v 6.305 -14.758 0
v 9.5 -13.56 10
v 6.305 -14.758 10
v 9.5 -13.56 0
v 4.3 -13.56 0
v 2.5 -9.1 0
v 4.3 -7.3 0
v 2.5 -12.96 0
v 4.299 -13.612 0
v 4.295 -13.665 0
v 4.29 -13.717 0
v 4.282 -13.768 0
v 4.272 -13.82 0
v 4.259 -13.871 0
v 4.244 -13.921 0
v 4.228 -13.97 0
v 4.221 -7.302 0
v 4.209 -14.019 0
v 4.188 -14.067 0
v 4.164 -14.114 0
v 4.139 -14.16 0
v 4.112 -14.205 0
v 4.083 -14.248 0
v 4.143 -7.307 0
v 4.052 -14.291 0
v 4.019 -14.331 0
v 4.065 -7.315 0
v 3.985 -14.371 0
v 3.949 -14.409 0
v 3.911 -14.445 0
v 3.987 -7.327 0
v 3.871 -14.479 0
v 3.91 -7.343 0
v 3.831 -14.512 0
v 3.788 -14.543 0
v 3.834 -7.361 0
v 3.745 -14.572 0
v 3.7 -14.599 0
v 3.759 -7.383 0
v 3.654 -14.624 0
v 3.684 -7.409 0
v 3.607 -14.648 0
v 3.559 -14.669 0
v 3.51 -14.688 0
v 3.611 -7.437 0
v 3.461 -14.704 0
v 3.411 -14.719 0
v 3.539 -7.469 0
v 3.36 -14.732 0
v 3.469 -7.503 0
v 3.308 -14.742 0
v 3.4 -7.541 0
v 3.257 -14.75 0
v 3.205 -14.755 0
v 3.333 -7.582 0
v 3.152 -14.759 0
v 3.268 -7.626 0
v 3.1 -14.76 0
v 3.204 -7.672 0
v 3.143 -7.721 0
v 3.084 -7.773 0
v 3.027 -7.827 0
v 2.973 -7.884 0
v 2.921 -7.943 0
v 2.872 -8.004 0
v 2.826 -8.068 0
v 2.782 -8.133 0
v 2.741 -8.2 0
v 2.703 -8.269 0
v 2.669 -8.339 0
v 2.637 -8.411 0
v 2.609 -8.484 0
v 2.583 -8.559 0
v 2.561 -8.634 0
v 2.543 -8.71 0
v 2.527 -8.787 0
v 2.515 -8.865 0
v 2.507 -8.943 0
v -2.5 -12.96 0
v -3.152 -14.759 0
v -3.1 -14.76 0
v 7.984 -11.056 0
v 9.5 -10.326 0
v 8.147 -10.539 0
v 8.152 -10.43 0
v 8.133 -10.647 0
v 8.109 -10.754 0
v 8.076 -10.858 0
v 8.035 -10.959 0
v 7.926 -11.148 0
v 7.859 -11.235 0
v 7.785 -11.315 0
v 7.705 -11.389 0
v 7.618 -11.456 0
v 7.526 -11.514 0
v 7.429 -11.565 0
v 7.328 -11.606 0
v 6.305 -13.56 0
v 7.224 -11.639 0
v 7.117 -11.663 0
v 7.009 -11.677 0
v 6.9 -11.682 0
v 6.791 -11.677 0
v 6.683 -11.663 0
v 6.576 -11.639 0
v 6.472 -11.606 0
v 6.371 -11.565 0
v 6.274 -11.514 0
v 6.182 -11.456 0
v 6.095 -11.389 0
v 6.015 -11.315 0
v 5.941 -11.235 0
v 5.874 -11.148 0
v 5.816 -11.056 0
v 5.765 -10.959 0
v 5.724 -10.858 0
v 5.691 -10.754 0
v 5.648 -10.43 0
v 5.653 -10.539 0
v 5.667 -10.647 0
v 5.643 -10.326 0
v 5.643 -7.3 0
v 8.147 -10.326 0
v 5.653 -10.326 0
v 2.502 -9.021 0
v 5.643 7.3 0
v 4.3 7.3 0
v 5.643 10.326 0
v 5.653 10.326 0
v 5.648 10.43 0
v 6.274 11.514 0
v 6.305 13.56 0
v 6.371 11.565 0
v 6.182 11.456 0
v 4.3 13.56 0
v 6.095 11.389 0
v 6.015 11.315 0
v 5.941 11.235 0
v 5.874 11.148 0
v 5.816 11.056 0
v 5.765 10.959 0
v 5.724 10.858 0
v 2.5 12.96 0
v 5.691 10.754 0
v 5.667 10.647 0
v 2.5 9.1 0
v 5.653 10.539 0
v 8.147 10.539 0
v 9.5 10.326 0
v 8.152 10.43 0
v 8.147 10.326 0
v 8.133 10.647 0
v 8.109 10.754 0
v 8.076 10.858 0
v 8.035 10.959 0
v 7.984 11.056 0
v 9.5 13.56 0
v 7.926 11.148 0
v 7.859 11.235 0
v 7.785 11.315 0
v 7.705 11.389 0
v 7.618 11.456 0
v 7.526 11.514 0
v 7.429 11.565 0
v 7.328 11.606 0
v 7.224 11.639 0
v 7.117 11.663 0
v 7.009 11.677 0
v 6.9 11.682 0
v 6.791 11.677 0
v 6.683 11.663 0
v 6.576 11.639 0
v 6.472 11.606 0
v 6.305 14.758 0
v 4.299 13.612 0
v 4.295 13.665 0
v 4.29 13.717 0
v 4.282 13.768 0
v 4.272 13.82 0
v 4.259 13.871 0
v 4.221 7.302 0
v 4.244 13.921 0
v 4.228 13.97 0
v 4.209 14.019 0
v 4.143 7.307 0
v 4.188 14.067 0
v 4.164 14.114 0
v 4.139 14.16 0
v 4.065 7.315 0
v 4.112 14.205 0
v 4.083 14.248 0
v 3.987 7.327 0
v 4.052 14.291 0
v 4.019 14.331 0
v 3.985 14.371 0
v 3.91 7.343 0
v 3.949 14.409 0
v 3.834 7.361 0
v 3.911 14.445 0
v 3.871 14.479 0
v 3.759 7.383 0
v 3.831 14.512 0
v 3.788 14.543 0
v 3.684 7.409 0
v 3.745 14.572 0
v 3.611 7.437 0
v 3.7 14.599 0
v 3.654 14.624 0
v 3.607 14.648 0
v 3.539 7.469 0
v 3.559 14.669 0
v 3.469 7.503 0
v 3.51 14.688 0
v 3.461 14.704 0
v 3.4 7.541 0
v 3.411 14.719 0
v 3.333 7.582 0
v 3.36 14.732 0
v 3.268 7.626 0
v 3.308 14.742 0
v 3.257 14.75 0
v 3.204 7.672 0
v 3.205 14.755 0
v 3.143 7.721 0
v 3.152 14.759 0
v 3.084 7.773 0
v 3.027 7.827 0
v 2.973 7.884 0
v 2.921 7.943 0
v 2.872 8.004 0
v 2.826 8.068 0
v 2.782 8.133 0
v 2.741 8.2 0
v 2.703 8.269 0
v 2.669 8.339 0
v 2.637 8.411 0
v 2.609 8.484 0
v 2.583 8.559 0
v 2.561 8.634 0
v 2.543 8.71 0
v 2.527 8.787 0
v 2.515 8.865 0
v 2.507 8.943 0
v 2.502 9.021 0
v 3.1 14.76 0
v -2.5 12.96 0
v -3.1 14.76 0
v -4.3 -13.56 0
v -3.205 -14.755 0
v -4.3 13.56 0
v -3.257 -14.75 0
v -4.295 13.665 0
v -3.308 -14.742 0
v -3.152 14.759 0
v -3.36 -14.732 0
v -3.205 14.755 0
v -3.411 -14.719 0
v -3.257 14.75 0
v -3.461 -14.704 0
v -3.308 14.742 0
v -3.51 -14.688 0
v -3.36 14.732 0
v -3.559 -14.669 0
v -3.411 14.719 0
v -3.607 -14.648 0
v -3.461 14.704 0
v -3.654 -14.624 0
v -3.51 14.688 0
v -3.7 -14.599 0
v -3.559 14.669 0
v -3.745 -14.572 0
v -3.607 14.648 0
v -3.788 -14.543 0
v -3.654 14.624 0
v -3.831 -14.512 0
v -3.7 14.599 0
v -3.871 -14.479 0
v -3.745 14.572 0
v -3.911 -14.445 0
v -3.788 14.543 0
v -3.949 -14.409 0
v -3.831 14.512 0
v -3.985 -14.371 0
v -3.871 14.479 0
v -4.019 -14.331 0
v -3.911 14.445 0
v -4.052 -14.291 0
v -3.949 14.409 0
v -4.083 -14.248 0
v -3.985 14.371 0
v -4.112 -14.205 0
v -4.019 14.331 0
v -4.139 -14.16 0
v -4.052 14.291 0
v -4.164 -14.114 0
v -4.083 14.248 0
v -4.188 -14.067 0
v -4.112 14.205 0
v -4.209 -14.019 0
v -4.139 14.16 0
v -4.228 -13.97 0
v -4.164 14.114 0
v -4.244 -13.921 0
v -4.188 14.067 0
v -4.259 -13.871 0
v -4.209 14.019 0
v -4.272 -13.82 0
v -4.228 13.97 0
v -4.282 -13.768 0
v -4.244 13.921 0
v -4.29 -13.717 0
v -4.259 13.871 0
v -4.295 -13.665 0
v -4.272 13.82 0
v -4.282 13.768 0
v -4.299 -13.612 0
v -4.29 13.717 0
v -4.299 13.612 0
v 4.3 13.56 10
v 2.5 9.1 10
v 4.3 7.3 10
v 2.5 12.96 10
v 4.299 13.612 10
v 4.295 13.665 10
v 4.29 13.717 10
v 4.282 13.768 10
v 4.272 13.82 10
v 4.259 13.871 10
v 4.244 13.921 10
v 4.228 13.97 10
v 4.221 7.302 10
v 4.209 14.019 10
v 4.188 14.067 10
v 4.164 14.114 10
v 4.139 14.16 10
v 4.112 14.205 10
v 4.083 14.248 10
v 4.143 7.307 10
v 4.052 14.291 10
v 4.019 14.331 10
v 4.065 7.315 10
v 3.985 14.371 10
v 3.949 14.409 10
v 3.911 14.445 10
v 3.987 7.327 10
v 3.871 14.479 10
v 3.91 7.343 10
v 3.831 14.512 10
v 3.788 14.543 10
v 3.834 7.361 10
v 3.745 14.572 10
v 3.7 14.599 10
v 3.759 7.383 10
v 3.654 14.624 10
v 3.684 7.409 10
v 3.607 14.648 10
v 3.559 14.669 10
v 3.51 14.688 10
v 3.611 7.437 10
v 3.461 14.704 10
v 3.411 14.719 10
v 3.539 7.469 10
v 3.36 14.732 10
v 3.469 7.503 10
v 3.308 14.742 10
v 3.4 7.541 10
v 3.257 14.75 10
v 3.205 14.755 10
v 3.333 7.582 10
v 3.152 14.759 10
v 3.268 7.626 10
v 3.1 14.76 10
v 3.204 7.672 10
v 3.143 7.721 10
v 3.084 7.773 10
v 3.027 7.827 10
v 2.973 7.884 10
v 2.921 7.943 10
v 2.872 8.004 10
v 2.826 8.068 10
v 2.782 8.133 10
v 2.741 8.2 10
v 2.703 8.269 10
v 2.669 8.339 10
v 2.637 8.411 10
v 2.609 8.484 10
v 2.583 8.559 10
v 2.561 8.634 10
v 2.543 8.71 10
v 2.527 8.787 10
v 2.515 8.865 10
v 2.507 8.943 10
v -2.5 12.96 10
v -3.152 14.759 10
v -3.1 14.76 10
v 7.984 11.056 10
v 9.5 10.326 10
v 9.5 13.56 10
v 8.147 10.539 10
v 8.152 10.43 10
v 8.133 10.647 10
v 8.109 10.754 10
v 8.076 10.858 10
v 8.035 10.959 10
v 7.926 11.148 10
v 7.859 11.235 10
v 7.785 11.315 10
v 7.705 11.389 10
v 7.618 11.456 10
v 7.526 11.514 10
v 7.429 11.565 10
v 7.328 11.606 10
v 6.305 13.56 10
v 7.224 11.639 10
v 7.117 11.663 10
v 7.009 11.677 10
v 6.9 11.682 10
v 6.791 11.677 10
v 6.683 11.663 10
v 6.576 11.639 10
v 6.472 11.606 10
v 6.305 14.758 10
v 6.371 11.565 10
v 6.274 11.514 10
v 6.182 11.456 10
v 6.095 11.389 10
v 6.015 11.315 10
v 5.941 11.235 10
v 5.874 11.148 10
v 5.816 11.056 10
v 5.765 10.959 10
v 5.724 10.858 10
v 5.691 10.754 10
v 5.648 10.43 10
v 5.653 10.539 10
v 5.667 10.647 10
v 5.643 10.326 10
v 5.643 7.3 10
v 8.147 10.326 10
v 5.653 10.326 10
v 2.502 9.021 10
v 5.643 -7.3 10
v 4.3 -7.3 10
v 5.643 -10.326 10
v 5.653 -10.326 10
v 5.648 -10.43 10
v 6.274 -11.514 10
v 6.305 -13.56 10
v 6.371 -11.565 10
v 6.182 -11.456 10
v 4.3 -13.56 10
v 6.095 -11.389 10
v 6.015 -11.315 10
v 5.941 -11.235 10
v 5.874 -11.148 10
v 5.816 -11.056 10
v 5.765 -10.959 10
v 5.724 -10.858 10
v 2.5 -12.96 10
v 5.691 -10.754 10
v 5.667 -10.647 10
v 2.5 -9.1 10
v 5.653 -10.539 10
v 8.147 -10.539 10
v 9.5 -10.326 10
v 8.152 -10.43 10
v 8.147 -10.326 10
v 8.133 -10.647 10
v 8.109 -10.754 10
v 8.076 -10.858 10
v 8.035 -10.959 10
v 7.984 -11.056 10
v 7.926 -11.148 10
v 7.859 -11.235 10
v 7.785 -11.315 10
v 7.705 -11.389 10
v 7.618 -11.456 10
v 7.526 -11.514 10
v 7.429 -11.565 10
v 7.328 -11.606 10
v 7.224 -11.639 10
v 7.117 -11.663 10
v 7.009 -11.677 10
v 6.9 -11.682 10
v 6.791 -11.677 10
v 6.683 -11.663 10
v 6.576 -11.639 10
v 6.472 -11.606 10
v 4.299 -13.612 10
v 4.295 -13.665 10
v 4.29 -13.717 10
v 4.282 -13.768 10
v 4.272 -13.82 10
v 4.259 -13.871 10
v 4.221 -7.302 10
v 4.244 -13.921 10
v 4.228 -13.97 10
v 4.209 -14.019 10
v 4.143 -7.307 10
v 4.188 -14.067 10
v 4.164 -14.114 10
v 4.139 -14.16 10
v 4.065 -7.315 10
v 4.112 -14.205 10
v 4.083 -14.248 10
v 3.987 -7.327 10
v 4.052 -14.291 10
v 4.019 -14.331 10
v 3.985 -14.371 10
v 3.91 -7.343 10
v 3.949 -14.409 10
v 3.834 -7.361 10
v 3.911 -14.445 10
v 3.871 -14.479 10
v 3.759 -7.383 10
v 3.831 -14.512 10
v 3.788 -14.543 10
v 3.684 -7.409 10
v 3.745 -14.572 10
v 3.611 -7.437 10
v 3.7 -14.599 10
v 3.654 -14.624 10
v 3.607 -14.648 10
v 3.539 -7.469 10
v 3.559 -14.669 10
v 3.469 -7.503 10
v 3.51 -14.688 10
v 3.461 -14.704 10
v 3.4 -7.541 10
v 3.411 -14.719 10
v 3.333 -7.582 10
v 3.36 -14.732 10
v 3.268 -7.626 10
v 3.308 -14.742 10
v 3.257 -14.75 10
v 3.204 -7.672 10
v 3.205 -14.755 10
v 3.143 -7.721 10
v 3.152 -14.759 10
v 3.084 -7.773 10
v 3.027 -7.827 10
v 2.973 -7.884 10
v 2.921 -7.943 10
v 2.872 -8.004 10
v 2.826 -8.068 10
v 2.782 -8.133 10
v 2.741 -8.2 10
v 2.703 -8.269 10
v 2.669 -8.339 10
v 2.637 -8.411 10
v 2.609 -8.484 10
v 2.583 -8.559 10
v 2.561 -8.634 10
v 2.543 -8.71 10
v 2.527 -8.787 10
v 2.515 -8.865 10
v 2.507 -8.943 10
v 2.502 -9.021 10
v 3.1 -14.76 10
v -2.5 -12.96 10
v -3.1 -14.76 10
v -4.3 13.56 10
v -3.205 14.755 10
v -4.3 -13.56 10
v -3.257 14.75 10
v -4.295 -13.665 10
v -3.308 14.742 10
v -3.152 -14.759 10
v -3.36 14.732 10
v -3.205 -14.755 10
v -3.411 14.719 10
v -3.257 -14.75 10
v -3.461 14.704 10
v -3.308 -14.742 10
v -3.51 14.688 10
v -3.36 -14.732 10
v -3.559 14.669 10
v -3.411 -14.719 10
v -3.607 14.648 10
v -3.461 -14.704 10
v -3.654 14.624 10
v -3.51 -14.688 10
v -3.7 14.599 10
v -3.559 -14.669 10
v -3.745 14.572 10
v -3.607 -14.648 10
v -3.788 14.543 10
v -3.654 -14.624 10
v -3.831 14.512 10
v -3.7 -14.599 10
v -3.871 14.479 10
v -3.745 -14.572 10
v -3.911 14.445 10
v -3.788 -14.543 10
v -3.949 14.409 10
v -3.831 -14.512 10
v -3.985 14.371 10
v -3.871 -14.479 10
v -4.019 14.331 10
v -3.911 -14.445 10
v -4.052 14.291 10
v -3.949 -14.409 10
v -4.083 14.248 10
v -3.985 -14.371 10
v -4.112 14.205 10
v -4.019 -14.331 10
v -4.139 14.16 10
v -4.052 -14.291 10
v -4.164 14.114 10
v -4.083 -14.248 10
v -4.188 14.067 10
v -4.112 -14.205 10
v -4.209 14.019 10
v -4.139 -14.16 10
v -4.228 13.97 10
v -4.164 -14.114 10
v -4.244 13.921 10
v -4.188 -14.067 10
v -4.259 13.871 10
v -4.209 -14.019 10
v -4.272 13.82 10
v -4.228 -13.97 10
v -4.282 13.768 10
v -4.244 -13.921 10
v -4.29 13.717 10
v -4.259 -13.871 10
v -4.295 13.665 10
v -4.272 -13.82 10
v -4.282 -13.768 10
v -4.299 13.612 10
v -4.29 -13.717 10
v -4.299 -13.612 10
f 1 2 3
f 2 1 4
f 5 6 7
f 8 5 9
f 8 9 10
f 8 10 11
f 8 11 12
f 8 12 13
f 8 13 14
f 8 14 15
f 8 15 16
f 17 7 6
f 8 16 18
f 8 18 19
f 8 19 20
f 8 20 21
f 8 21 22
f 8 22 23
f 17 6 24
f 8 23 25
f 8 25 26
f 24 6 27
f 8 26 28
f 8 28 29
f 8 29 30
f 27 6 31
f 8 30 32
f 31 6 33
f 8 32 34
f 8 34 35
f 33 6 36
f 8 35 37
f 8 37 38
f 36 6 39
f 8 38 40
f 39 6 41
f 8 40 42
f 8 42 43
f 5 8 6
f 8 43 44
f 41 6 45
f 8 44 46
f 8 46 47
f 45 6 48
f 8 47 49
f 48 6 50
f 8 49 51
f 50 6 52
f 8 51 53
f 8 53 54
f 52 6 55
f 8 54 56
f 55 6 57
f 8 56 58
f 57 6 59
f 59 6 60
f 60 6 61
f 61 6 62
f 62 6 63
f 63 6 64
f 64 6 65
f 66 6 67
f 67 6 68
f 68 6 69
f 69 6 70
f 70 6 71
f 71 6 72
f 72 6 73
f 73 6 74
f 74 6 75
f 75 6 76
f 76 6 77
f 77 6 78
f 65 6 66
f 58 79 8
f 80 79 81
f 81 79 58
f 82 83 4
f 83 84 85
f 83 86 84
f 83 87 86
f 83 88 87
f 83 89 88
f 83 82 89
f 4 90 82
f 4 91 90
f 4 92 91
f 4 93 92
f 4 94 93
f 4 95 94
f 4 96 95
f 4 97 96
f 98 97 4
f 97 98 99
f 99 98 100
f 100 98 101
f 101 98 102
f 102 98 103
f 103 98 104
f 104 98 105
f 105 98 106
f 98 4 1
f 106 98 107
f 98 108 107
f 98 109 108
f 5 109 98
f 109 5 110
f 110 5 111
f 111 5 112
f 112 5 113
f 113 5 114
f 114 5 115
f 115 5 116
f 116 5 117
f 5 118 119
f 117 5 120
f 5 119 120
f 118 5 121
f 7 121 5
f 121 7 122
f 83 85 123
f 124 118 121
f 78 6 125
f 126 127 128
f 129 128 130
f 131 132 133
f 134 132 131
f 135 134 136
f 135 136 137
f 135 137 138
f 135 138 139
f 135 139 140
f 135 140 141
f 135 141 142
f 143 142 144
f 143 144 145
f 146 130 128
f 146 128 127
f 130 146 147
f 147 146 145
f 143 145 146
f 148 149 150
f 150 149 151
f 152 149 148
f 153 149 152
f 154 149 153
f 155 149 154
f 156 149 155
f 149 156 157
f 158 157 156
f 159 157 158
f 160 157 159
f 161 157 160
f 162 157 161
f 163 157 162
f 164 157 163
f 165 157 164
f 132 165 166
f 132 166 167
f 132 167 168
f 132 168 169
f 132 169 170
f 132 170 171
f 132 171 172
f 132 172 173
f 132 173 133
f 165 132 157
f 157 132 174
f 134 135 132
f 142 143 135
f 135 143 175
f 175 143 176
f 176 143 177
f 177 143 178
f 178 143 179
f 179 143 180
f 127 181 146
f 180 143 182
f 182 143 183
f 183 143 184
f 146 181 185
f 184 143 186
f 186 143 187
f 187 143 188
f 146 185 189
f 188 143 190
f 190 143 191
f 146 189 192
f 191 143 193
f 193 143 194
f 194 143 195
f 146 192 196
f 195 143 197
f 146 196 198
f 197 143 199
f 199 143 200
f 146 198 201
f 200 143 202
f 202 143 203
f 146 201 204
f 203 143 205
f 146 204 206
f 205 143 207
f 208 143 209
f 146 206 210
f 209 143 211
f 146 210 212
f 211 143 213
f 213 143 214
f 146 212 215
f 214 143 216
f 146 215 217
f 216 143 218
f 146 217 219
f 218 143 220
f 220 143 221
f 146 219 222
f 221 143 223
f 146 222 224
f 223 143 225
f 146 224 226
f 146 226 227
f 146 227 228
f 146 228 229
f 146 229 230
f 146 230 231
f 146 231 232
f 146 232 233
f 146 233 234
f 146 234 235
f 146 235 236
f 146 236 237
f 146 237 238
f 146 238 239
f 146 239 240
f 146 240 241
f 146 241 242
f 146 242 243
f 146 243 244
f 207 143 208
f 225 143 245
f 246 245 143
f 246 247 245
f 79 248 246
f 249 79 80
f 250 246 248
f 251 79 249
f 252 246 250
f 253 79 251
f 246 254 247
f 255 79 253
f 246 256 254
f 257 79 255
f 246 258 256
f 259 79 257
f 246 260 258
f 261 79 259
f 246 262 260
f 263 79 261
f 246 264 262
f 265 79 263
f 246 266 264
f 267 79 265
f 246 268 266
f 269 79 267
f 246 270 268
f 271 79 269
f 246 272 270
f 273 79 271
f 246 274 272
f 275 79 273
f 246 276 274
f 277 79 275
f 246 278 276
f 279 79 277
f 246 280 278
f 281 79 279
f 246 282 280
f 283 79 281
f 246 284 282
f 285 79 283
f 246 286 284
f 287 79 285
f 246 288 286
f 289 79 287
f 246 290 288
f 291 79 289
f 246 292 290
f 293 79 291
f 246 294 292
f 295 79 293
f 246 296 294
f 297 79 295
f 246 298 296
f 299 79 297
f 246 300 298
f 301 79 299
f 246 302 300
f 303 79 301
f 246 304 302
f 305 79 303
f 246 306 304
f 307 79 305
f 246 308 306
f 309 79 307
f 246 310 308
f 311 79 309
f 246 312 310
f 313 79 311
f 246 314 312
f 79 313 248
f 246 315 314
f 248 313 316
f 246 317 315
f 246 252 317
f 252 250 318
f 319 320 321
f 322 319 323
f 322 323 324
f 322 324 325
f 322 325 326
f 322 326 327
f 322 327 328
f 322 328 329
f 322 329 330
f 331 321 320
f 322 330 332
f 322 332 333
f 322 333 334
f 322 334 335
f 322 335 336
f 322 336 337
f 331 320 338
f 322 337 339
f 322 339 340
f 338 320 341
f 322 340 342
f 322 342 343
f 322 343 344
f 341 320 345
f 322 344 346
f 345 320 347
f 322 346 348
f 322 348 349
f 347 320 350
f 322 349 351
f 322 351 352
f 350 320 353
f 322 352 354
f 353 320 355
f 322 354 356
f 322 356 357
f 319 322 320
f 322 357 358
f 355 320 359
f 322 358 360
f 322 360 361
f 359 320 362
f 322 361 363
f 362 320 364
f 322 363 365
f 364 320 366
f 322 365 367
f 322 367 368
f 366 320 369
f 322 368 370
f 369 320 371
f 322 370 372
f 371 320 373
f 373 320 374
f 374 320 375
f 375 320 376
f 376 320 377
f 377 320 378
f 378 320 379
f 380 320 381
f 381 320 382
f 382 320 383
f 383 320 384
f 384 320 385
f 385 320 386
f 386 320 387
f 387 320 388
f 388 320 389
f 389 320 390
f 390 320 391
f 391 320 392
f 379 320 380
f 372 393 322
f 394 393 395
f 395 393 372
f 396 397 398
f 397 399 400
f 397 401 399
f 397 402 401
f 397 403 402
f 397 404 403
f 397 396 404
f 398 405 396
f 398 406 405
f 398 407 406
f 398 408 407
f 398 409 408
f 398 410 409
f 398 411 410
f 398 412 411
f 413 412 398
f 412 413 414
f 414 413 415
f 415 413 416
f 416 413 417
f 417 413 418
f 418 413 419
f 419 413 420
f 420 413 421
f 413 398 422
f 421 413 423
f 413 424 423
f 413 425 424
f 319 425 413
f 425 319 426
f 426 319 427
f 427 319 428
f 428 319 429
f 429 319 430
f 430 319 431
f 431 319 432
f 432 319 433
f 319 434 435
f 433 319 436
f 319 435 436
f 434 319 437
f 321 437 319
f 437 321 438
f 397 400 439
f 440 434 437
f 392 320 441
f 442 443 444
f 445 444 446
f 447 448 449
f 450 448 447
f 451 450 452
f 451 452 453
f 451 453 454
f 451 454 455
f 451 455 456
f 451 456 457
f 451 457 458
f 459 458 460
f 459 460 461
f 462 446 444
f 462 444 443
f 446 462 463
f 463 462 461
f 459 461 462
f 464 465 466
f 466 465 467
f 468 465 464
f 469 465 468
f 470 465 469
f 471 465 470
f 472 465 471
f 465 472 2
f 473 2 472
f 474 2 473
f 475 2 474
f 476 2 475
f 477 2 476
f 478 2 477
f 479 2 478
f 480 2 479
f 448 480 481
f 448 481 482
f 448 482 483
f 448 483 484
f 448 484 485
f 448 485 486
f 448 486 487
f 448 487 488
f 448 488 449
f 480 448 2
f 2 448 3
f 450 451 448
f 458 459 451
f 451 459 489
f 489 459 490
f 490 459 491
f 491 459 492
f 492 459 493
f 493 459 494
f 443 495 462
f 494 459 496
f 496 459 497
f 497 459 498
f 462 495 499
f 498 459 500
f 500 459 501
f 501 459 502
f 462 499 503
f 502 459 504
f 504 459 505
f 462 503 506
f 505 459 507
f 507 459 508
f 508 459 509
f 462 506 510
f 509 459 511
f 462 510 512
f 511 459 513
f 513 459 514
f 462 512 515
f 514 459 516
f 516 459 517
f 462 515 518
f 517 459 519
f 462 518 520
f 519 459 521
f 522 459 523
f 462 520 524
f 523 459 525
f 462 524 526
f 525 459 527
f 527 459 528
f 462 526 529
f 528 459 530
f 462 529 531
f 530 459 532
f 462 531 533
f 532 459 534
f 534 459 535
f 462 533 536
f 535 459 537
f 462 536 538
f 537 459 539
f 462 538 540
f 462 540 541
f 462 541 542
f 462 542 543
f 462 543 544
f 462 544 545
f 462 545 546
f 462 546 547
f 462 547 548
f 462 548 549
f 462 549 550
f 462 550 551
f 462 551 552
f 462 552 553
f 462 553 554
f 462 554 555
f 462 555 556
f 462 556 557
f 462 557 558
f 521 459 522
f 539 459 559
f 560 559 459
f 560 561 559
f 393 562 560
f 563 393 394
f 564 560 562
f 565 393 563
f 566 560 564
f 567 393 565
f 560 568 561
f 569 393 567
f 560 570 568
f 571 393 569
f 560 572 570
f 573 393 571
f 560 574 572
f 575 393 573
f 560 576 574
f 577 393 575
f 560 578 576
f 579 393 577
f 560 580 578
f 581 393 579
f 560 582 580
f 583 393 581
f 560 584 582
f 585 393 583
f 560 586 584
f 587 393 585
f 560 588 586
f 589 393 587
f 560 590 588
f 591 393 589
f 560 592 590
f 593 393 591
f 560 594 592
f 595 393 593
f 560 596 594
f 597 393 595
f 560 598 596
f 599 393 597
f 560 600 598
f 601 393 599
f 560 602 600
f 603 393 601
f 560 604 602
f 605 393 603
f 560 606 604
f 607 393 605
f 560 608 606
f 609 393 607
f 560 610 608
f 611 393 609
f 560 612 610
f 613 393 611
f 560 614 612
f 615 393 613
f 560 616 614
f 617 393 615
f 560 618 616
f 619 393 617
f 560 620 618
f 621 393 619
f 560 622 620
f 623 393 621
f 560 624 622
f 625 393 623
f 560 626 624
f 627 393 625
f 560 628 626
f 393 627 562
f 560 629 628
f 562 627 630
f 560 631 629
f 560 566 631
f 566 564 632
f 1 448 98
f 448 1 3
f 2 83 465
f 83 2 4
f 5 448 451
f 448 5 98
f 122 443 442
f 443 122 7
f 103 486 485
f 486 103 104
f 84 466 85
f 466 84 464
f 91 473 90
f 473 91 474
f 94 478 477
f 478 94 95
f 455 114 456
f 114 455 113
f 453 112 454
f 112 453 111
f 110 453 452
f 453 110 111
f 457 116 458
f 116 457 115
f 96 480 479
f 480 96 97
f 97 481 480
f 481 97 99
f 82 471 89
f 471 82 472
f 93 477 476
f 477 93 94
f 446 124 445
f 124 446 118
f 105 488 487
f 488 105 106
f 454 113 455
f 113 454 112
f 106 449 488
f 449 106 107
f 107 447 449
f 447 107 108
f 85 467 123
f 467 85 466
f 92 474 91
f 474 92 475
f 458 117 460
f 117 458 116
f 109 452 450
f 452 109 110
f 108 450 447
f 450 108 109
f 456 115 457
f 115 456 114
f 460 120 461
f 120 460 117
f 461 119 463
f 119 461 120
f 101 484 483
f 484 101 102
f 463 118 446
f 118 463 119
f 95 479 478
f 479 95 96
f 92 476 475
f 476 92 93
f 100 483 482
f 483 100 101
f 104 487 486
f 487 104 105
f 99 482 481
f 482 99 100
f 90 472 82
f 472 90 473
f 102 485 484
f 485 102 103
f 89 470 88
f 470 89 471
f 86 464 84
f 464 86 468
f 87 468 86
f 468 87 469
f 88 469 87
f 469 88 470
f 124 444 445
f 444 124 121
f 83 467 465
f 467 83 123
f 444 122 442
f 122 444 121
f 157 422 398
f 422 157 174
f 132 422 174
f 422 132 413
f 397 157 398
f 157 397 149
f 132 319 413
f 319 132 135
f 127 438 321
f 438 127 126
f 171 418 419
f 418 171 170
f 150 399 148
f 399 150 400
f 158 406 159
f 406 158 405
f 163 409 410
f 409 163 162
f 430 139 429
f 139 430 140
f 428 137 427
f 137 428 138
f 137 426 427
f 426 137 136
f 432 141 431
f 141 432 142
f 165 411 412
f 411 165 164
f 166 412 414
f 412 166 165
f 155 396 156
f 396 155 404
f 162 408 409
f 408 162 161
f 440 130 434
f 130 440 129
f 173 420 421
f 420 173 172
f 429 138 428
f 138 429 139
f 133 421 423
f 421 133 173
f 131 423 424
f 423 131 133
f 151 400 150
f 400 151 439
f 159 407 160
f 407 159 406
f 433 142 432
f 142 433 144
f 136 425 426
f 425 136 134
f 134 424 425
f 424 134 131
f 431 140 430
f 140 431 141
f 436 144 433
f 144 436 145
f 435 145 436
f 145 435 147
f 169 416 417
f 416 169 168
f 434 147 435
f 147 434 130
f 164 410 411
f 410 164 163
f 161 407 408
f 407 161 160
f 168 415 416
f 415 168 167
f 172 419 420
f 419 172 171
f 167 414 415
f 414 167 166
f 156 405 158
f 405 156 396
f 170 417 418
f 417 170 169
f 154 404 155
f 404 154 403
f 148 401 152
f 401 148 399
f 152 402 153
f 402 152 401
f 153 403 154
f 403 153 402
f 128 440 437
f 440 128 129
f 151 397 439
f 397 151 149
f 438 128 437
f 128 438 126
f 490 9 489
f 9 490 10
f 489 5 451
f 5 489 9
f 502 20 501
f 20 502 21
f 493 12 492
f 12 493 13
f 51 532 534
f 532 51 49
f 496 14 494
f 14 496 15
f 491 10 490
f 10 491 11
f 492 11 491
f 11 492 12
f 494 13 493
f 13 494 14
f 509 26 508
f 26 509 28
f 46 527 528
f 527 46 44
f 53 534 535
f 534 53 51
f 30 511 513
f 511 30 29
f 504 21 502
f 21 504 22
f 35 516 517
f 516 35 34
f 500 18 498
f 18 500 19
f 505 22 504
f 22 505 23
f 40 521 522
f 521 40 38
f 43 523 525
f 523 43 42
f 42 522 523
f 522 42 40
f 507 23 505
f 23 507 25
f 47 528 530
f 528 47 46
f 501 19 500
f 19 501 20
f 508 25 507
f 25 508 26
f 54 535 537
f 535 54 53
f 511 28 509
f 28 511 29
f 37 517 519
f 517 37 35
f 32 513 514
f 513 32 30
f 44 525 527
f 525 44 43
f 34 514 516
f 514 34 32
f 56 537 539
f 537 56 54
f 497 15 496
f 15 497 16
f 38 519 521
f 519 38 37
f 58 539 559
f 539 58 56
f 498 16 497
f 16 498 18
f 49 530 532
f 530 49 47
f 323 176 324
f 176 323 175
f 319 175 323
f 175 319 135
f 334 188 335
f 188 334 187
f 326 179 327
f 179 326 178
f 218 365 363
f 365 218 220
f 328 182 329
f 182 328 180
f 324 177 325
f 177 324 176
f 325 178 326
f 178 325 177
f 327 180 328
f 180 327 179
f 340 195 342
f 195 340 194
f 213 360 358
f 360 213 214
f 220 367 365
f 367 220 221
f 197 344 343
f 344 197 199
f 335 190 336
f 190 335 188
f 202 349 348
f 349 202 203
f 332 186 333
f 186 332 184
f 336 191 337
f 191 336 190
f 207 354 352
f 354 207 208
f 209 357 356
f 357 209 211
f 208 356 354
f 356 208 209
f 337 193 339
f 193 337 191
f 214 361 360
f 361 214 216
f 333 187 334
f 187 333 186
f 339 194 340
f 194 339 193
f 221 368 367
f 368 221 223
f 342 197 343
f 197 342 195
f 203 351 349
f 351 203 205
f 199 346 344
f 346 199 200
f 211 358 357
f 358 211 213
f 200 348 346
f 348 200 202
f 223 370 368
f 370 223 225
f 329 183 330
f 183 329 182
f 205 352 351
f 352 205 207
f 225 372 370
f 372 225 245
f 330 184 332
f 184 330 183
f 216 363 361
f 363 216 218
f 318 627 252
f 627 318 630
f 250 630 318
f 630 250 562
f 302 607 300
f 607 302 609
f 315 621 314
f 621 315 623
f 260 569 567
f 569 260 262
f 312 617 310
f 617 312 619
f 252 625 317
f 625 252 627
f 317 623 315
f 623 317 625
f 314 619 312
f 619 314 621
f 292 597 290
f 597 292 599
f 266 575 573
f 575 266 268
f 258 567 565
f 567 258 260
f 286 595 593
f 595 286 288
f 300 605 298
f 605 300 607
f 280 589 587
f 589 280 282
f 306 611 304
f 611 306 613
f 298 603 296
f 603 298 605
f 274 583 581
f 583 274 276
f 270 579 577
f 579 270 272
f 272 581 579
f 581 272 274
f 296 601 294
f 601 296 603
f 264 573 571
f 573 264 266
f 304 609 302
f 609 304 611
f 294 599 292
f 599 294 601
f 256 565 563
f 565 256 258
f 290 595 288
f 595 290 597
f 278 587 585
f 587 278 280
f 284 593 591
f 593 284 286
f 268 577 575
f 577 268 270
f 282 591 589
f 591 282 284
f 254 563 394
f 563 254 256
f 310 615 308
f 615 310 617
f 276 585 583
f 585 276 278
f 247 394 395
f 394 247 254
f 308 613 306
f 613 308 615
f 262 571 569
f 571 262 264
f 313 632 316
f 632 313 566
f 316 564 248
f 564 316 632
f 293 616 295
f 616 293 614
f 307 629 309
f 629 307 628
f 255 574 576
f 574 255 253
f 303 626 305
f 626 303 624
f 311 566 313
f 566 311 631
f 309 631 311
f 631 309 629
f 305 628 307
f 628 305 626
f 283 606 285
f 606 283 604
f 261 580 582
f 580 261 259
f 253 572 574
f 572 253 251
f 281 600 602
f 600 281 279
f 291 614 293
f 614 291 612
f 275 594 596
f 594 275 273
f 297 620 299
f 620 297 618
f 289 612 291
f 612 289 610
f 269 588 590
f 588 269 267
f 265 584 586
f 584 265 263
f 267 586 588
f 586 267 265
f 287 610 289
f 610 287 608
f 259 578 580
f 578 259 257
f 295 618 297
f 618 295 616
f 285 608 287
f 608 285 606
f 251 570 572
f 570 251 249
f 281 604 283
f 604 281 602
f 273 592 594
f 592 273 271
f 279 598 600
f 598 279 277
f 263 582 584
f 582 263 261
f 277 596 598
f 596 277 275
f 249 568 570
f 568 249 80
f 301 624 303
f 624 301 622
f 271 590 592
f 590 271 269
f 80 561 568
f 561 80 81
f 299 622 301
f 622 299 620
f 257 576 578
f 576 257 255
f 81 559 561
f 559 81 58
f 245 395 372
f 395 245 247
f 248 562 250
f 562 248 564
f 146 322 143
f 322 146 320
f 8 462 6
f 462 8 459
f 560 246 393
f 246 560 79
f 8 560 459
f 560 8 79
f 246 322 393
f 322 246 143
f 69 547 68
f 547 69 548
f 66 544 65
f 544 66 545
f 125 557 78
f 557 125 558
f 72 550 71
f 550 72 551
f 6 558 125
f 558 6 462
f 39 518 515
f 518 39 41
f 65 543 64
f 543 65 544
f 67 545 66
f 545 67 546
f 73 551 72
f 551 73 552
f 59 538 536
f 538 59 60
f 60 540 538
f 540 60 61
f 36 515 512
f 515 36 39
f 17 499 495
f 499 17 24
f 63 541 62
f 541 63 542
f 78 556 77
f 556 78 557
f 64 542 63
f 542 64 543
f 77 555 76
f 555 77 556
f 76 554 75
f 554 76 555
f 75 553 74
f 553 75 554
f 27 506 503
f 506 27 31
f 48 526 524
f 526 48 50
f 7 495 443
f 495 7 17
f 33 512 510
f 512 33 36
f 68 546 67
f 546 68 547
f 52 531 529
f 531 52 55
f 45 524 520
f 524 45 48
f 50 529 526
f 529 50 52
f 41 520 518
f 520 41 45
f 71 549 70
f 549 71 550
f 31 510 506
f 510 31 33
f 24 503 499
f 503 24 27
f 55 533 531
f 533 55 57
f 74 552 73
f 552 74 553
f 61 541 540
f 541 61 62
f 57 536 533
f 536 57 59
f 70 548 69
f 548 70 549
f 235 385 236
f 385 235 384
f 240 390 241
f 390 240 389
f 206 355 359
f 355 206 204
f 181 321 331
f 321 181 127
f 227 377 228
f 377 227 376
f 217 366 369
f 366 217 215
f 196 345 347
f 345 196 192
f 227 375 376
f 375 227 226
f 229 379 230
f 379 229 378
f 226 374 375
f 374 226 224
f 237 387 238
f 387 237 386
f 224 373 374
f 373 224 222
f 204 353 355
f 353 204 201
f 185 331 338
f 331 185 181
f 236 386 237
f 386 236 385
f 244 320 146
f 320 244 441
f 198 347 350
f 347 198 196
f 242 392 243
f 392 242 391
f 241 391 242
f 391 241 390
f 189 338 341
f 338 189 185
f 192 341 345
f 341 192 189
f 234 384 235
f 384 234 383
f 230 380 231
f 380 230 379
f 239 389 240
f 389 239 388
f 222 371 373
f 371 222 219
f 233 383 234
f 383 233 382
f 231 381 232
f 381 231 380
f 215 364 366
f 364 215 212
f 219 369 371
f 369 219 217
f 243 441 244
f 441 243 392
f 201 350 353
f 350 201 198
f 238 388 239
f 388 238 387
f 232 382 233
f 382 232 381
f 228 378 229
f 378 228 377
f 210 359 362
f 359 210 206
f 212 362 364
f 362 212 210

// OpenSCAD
height1 = 28; // How far does the part stretch over the extrusion.
depth1 = 8; // The distance from the extrusion surface to the outer edge of the channel.
width = 10; // The width of the clip.
channel_gap = 14.60; // The distance between the inner edges of the channels in the extrusion.
channel_depth = 5.2; // The depth of the channels.
channel_width = 6.26; // The width of the channels.
thickness = 1.8; // The thickness of the clip.
clip_dist = 1.2; // The distance by which the clip extends beyond the entry width of the channel.
clip_over_t = 2; // The thickness of the narrowing of the channels.
tol01 = 0.01; // A small value to avoid coincident surfaces causing rendering problems.
snapIn = true; // If True then you can clip the part into the extrusion. If False you'll probably have to slide it into the extrusion while constructing your project

height = height1<(2*channel_width + channel_gap +clip_dist*2) ? 2*channel_width + channel_gap +clip_dist*2 : height1 ; // ensure the height is not less than required to provide a lip over the edge of each channel

depth = depth1<(2*thickness+5) ? 2*thickness+5 : depth1 ;

feature_dia = (height-channel_gap-channel_width*2)/2<(depth-thickness*2)/2 ? (height-channel_gap-channel_width*2)/2 : (depth-thickness*2)/2 ;

feature_dia_inner = (feature_dia-channel_width/2)<0 ?  0 : feature_dia-channel_width/2 ;

module holder(){
    difference(){
        cube([depth,width,height],center=true);
        translate([0,0,0]) cube([depth-thickness*2,width+tol01,height-depth],center=true);
        translate([thickness/2+tol01/2,0,0]) cube([depth-thickness+tol01,width+tol01,channel_gap],center=true);      
        translate([depth/2-feature_dia,0,height/2-feature_dia]) difference(){
            translate([(feature_dia+tol01)/2,0,+feature_dia/2+tol01/2]) cube([feature_dia+tol01,width+tol01,feature_dia+tol01],center=true);
            translate([0,0,0]) rotate([90,0,0]) cylinder(h=width+tol01*2,d=feature_dia*2,$fn=144,center=true);
        }
        scale([1,1,-1]) translate([depth/2-feature_dia,0,height/2-feature_dia]) difference(){
            translate([(feature_dia+tol01)/2,0,+feature_dia/2+tol01/2]) cube([feature_dia+tol01,width+tol01,feature_dia+tol01],center=true);
            translate([0,0,0]) rotate([90,0,0]) cylinder(h=width+tol01*2,d=feature_dia*2,$fn=144,center=true);
        }        
        scale([-1,1,-1]) translate([depth/2-feature_dia,0,height/2-feature_dia]) difference(){
            translate([(feature_dia+tol01)/2,0,+feature_dia/2+tol01/2]) cube([feature_dia+tol01,width+tol01,feature_dia+tol01],center=true);
            translate([0,0,0]) rotate([90,0,0]) cylinder(h=width+tol01*2,d=feature_dia*2,$fn=144,center=true);
        }
        scale([-1,1,1]) translate([depth/2-feature_dia,0,height/2-feature_dia]) difference(){
            translate([(feature_dia+tol01)/2,0,+feature_dia/2+tol01/2]) cube([feature_dia+tol01,width+tol01,feature_dia+tol01],center=true);
            translate([0,0,0]) rotate([90,0,0]) cylinder(h=width+tol01*2,d=feature_dia*2,$fn=144,center=true);
        }
        translate([depth/2-thickness-feature_dia_inner,0,height/2-thickness-feature_dia_inner]) rotate([90,0,0]) cylinder(h=width+tol01,d=feature_dia_inner*2,$fn=72,center=true);
        scale([1,1,-1]) translate([depth/2-thickness-feature_dia_inner,0,height/2-thickness-feature_dia_inner]) rotate([90,0,0]) cylinder(h=width+tol01,d=feature_dia_inner*2,$fn=72,center=true);
        scale([-1,1,-1]) translate([depth/2-thickness-feature_dia_inner,0,height/2-thickness-feature_dia_inner]) rotate([90,0,0]) cylinder(h=width+tol01,d=feature_dia_inner*2,$fn=72,center=true);
        scale([-1,1,1]) translate([depth/2-thickness-feature_dia_inner,0,height/2-thickness-feature_dia_inner]) rotate([90,0,0]) cylinder(h=width+tol01,d=feature_dia_inner*2,$fn=72,center=true);
        cube([depth-thickness*2,width+tol01,height-(thickness+feature_dia_inner)*2],center=true);
        cube([depth-(feature_dia_inner+thickness)*2,width+tol01,height-thickness*2],center=true);
    }
}

module clip(){
    difference(){
        union(){
            translate([-thickness/2,0,0]) cube([channel_depth+thickness,width,channel_width],center=true);
            difference(){
                translate([-channel_depth/2+clip_over_t,0,channel_width/2]) rotate([90,0,0]) scale([channel_depth-clip_over_t,clip_dist,1]) cylinder(h=width,d=2,$fn=4,center=true);
                translate([-(channel_depth-clip_over_t)/2-channel_depth/2+clip_over_t,0,channel_width/2]) cube([channel_depth-clip_over_t+tol01,width+tol01,clip_dist*2+tol01],center=true);
            }
            difference(){
                translate([-channel_depth/2+clip_over_t,0,-channel_width/2]) rotate([90,0,0]) scale([channel_depth-clip_over_t,clip_dist,1]) cylinder(h=width,d=2,$fn=4,center=true);
                translate([-(channel_depth-clip_over_t)/2-channel_depth/2+clip_over_t,0,-channel_width/2]) cube([channel_depth-clip_over_t+tol01,width+tol01,clip_dist*2+tol01],center=true);
            }
        }
        rotate([0,90,90]) cylinder(h=width+tol01,d=channel_width/2.5,$fn=72,center=true);
        translate([channel_depth/2,0,0]) cube([channel_depth+tol01,width+tol01,channel_width/2.5],center=true);
    }
}

module clip2(){
    difference(){
        union(){
            translate([-thickness/2,0,0]) cube([channel_depth+thickness,width,channel_width],center=true);
            difference(){
                translate([-channel_depth/2+clip_over_t,0,channel_width/2]) rotate([90,0,0]) scale([channel_depth-clip_over_t,clip_dist,1]) cylinder(h=width,d=2,$fn=4,center=true);
                translate([-(channel_depth-clip_over_t)/2-channel_depth/2+clip_over_t,0,channel_width/2]) cube([channel_depth-clip_over_t+tol01,width+tol01,clip_dist*2+tol01],center=true);
            }
        }
        rotate([0,90,90]) cylinder(h=width+tol01,d=channel_width/2.5,$fn=72,center=true);
        translate([channel_depth/2,0,-channel_width/3.75]) cube([channel_depth+tol01+channel_width/2.5,width+tol01,channel_width/2],center=true);
    }
}

module assembly(){
    difference(){
        union(){
            translate([depth/2+channel_depth/2,0,channel_width/2+channel_gap/2]) clip2();
            translate([depth/2+channel_depth/2,0,-channel_width/2-channel_gap/2]) rotate([180,0,0]) clip2();
            holder();
        }
    difference(){
                translate([depth/2-thickness*.5-tol01/2,0,channel_gap/2+thickness/2-tol01/2]) cube([thickness+tol01,width+tol01,thickness+tol01],center=true);
                translate([depth/2,0,channel_gap/2+thickness]) rotate([90,0,0]) cylinder(h=width+tol01*2,d=thickness*2,$fn=144,center=true);
            }
    difference(){
                translate([depth/2-thickness*.5-tol01/2,0,-channel_gap/2-thickness/2+tol01/2]) cube([thickness+tol01,width+tol01,thickness+tol01],center=true);
                translate([depth/2,0,-channel_gap/2-thickness]) rotate([90,0,0]) cylinder(h=width+tol01*2,d=thickness*2,$fn=144,center=true);
        }
    }
}

translate([0,0,width/2]) rotate([90,0,0]) assembly();
